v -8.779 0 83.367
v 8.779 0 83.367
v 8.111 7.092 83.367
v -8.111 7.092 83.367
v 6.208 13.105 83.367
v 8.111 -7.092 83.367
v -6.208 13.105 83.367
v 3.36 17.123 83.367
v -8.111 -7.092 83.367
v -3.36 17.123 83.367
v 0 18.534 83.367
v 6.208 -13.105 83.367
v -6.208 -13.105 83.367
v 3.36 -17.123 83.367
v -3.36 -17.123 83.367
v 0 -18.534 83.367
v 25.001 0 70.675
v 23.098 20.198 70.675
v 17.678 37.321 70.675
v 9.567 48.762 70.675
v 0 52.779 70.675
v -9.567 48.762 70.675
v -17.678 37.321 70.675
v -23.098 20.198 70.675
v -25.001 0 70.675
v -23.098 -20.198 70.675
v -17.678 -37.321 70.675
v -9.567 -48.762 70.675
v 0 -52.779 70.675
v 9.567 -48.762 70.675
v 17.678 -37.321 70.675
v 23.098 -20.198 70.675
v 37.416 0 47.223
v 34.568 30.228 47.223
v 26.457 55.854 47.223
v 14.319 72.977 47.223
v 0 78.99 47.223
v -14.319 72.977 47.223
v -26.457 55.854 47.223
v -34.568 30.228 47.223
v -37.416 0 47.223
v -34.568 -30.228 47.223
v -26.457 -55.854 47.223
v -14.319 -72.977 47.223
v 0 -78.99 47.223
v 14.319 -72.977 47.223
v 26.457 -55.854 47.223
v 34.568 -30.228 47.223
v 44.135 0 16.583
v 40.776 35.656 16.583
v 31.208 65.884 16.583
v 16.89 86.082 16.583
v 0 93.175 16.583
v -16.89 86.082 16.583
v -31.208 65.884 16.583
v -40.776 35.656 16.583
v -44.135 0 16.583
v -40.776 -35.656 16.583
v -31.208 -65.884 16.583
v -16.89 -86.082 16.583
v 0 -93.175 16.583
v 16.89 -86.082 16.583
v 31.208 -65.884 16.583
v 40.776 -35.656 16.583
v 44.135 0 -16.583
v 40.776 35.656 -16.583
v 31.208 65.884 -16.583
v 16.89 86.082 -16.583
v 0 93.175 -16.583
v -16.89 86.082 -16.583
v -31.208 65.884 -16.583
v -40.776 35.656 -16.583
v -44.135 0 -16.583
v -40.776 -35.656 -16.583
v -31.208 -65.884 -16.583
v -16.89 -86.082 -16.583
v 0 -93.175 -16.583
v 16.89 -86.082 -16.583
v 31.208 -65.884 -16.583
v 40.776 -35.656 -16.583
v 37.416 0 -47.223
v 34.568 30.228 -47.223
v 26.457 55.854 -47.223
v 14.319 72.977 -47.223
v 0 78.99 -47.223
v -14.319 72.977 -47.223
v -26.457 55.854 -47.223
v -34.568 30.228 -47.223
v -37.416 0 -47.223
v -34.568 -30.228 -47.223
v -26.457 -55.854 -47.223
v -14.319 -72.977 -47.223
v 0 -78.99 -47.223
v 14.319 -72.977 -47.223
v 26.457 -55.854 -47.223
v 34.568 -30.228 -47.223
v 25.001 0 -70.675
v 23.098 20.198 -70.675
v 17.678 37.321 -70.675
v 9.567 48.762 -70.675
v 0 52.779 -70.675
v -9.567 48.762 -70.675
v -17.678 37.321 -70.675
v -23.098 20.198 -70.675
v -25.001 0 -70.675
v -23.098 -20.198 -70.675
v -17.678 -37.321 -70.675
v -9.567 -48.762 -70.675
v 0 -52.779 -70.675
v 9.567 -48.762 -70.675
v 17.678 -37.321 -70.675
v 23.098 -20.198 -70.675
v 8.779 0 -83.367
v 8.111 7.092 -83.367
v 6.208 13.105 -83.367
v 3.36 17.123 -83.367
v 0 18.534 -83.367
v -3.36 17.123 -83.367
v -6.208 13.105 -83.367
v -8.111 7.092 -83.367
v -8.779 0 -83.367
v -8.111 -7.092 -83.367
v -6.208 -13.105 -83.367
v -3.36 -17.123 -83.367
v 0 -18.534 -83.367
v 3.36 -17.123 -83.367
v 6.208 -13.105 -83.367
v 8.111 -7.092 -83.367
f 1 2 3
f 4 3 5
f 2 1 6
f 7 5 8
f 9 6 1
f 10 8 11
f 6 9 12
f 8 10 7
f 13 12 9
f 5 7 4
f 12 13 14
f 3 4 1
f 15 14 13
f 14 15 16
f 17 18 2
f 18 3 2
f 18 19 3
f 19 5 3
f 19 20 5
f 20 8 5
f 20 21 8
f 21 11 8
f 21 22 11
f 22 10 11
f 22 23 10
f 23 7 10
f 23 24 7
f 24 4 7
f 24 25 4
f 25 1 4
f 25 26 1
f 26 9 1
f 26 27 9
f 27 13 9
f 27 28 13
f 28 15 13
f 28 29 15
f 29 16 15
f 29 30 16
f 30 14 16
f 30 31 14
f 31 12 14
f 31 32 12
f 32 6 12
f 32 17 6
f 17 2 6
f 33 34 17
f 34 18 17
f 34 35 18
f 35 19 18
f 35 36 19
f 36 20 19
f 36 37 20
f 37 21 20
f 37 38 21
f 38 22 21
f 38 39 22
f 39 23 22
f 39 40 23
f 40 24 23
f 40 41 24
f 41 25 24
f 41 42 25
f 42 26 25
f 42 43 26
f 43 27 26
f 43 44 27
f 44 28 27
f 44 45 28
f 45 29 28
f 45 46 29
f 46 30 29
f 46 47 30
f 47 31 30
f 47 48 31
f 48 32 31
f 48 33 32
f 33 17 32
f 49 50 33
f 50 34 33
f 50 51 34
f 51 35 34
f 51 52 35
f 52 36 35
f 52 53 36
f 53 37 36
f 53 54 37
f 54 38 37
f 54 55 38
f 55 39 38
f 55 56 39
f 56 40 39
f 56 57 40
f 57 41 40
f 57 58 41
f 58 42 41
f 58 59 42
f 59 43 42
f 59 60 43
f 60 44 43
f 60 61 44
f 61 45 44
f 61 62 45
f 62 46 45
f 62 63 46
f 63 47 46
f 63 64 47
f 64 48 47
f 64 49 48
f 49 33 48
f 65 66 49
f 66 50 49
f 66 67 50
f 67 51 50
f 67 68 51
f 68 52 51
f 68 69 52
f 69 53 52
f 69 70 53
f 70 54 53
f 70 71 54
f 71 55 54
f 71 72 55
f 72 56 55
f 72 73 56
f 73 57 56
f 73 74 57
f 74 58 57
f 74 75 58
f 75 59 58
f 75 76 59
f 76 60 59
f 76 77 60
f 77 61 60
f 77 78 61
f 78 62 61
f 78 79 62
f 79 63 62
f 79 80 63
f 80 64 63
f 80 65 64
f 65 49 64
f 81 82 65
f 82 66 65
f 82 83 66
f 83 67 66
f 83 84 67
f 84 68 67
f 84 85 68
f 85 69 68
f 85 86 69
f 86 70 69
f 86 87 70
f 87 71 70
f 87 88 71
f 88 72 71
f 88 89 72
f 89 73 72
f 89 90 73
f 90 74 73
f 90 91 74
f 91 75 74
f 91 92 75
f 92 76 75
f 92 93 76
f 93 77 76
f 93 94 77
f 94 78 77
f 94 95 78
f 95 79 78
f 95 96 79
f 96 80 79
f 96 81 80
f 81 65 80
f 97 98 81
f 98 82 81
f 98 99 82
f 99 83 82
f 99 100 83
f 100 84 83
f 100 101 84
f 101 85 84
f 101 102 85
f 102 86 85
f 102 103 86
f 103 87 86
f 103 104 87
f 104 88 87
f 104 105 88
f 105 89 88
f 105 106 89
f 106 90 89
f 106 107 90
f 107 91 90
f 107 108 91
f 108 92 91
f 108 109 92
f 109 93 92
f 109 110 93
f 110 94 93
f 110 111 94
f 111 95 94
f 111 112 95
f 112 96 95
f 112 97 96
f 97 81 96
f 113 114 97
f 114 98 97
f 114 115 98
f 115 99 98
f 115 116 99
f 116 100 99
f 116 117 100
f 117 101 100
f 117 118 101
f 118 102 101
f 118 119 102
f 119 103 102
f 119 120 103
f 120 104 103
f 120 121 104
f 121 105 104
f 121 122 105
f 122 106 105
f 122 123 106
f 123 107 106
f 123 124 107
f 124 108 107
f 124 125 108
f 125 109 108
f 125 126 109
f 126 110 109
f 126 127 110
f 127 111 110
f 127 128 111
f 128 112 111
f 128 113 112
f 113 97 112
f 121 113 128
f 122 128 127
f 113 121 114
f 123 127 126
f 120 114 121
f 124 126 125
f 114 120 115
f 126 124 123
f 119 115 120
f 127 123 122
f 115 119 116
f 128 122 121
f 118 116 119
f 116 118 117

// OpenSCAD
// Generated by SolidPython 1.0.1 on 2020-07-29 00:46:49


scale(v = [9, 19, 17]) {
	sphere(r = 5);
}
/***********************************************
*********      SolidPython code:      **********
************************************************
 
# import packages: SolidPython
from solid import *
from solid.utils import *
from itertools import chain, combinations, permutations


class Resize:

    def __init__(self, scad_file):
        self.scad_file = scad_file
        #self.scad_file = import_scad(scad_file)
        # cone/cylinder param:
        self.r1 = 0
        self.r2 = 0
        self.h = 0
        # rectangular prism param:
        self.w = 0
        self.l = 0
        # ellipse param:
        self.r = 0

    # import OpenScad code (file name corresponds to shape)


    # classify shape + parameters
    def assign(self, param1, param2, param3):
        if self.scad_file == 'cone.scad':
            self.r1 = param1
            self.r2 = param2
            self.h = param3
        elif self.scad_file == 'cylinder.scad':
            self.r1 = param1
            self.r2 = param2
            self.h = param3
        elif self.scad_file == 'rectangularPrism.scad':
            self.h = param1
            self.l = param2
            self.w = param3
        else:
            self.r = param1
            self.h = param2

    # resize parameters
    def iterate(self):
        x = range(3, 20, 2)
        i = 1
        if self.scad_file == 'cone.scad':
            tempList = list(permutations(x, 2))
            for temp in tempList:
                param1 = temp[0]
                param2 = temp[1]
                filepath = 'produced_scad_files/' + 'cone' + str(param1) + '_' + str(param2) + '_' + '.scad'
                scad_render_to_file(cylinder(h=param1, r1=param2, r2=0), filepath)

        elif self.scad_file == 'cylinder.scad':
            tempList = list(permutations(x, 3))
            for temp in tempList:
                param1 = temp[0]
                param2 = temp[1]
                filepath = 'produced_scad_files/' + 'cylinder' + str(param1) + '_' + str(param2) + '_' + '.scad'
                scad_render_to_file(cylinder(h=param1, r1=param2, r2=param2), filepath)

        elif self.scad_file == 'rectangularPrism.scad':
            tempList = list(permutations(x, 3))
            for temp in tempList:
                param1 = temp[0]
                param2 = temp[1]
                param3 = temp[2]
                filepath = 'produced_scad_files/' + 'rectangularPrism' + str(param1) + '_' + str(param2) + '_' + str(
                    param3) + '.scad'
                scad_render_to_file(cube(size=(param1, param2, param3)), filepath)

        elif self.scad_file == 'ellipse.scad':
            tempList = list(permutations(x, 4))
            for temp in tempList:
                param1 = temp[0]
                param2 = temp[1]
                param3 = temp[2]
                param4 = temp[3]
                filepath = 'produced_scad_files/' + 'ellipse' + str(param1) + '_' + str(param2) + '_' + str(param3) + '_' + str(param4) + '.scad'
                scad_render_to_file(scale([param1, param2, param3])(sphere(r=param4)), filepath)

    def render_to_scadfile(self):
        scad_render_to_file(scad, 'example.scad') 
 
************************************************/
